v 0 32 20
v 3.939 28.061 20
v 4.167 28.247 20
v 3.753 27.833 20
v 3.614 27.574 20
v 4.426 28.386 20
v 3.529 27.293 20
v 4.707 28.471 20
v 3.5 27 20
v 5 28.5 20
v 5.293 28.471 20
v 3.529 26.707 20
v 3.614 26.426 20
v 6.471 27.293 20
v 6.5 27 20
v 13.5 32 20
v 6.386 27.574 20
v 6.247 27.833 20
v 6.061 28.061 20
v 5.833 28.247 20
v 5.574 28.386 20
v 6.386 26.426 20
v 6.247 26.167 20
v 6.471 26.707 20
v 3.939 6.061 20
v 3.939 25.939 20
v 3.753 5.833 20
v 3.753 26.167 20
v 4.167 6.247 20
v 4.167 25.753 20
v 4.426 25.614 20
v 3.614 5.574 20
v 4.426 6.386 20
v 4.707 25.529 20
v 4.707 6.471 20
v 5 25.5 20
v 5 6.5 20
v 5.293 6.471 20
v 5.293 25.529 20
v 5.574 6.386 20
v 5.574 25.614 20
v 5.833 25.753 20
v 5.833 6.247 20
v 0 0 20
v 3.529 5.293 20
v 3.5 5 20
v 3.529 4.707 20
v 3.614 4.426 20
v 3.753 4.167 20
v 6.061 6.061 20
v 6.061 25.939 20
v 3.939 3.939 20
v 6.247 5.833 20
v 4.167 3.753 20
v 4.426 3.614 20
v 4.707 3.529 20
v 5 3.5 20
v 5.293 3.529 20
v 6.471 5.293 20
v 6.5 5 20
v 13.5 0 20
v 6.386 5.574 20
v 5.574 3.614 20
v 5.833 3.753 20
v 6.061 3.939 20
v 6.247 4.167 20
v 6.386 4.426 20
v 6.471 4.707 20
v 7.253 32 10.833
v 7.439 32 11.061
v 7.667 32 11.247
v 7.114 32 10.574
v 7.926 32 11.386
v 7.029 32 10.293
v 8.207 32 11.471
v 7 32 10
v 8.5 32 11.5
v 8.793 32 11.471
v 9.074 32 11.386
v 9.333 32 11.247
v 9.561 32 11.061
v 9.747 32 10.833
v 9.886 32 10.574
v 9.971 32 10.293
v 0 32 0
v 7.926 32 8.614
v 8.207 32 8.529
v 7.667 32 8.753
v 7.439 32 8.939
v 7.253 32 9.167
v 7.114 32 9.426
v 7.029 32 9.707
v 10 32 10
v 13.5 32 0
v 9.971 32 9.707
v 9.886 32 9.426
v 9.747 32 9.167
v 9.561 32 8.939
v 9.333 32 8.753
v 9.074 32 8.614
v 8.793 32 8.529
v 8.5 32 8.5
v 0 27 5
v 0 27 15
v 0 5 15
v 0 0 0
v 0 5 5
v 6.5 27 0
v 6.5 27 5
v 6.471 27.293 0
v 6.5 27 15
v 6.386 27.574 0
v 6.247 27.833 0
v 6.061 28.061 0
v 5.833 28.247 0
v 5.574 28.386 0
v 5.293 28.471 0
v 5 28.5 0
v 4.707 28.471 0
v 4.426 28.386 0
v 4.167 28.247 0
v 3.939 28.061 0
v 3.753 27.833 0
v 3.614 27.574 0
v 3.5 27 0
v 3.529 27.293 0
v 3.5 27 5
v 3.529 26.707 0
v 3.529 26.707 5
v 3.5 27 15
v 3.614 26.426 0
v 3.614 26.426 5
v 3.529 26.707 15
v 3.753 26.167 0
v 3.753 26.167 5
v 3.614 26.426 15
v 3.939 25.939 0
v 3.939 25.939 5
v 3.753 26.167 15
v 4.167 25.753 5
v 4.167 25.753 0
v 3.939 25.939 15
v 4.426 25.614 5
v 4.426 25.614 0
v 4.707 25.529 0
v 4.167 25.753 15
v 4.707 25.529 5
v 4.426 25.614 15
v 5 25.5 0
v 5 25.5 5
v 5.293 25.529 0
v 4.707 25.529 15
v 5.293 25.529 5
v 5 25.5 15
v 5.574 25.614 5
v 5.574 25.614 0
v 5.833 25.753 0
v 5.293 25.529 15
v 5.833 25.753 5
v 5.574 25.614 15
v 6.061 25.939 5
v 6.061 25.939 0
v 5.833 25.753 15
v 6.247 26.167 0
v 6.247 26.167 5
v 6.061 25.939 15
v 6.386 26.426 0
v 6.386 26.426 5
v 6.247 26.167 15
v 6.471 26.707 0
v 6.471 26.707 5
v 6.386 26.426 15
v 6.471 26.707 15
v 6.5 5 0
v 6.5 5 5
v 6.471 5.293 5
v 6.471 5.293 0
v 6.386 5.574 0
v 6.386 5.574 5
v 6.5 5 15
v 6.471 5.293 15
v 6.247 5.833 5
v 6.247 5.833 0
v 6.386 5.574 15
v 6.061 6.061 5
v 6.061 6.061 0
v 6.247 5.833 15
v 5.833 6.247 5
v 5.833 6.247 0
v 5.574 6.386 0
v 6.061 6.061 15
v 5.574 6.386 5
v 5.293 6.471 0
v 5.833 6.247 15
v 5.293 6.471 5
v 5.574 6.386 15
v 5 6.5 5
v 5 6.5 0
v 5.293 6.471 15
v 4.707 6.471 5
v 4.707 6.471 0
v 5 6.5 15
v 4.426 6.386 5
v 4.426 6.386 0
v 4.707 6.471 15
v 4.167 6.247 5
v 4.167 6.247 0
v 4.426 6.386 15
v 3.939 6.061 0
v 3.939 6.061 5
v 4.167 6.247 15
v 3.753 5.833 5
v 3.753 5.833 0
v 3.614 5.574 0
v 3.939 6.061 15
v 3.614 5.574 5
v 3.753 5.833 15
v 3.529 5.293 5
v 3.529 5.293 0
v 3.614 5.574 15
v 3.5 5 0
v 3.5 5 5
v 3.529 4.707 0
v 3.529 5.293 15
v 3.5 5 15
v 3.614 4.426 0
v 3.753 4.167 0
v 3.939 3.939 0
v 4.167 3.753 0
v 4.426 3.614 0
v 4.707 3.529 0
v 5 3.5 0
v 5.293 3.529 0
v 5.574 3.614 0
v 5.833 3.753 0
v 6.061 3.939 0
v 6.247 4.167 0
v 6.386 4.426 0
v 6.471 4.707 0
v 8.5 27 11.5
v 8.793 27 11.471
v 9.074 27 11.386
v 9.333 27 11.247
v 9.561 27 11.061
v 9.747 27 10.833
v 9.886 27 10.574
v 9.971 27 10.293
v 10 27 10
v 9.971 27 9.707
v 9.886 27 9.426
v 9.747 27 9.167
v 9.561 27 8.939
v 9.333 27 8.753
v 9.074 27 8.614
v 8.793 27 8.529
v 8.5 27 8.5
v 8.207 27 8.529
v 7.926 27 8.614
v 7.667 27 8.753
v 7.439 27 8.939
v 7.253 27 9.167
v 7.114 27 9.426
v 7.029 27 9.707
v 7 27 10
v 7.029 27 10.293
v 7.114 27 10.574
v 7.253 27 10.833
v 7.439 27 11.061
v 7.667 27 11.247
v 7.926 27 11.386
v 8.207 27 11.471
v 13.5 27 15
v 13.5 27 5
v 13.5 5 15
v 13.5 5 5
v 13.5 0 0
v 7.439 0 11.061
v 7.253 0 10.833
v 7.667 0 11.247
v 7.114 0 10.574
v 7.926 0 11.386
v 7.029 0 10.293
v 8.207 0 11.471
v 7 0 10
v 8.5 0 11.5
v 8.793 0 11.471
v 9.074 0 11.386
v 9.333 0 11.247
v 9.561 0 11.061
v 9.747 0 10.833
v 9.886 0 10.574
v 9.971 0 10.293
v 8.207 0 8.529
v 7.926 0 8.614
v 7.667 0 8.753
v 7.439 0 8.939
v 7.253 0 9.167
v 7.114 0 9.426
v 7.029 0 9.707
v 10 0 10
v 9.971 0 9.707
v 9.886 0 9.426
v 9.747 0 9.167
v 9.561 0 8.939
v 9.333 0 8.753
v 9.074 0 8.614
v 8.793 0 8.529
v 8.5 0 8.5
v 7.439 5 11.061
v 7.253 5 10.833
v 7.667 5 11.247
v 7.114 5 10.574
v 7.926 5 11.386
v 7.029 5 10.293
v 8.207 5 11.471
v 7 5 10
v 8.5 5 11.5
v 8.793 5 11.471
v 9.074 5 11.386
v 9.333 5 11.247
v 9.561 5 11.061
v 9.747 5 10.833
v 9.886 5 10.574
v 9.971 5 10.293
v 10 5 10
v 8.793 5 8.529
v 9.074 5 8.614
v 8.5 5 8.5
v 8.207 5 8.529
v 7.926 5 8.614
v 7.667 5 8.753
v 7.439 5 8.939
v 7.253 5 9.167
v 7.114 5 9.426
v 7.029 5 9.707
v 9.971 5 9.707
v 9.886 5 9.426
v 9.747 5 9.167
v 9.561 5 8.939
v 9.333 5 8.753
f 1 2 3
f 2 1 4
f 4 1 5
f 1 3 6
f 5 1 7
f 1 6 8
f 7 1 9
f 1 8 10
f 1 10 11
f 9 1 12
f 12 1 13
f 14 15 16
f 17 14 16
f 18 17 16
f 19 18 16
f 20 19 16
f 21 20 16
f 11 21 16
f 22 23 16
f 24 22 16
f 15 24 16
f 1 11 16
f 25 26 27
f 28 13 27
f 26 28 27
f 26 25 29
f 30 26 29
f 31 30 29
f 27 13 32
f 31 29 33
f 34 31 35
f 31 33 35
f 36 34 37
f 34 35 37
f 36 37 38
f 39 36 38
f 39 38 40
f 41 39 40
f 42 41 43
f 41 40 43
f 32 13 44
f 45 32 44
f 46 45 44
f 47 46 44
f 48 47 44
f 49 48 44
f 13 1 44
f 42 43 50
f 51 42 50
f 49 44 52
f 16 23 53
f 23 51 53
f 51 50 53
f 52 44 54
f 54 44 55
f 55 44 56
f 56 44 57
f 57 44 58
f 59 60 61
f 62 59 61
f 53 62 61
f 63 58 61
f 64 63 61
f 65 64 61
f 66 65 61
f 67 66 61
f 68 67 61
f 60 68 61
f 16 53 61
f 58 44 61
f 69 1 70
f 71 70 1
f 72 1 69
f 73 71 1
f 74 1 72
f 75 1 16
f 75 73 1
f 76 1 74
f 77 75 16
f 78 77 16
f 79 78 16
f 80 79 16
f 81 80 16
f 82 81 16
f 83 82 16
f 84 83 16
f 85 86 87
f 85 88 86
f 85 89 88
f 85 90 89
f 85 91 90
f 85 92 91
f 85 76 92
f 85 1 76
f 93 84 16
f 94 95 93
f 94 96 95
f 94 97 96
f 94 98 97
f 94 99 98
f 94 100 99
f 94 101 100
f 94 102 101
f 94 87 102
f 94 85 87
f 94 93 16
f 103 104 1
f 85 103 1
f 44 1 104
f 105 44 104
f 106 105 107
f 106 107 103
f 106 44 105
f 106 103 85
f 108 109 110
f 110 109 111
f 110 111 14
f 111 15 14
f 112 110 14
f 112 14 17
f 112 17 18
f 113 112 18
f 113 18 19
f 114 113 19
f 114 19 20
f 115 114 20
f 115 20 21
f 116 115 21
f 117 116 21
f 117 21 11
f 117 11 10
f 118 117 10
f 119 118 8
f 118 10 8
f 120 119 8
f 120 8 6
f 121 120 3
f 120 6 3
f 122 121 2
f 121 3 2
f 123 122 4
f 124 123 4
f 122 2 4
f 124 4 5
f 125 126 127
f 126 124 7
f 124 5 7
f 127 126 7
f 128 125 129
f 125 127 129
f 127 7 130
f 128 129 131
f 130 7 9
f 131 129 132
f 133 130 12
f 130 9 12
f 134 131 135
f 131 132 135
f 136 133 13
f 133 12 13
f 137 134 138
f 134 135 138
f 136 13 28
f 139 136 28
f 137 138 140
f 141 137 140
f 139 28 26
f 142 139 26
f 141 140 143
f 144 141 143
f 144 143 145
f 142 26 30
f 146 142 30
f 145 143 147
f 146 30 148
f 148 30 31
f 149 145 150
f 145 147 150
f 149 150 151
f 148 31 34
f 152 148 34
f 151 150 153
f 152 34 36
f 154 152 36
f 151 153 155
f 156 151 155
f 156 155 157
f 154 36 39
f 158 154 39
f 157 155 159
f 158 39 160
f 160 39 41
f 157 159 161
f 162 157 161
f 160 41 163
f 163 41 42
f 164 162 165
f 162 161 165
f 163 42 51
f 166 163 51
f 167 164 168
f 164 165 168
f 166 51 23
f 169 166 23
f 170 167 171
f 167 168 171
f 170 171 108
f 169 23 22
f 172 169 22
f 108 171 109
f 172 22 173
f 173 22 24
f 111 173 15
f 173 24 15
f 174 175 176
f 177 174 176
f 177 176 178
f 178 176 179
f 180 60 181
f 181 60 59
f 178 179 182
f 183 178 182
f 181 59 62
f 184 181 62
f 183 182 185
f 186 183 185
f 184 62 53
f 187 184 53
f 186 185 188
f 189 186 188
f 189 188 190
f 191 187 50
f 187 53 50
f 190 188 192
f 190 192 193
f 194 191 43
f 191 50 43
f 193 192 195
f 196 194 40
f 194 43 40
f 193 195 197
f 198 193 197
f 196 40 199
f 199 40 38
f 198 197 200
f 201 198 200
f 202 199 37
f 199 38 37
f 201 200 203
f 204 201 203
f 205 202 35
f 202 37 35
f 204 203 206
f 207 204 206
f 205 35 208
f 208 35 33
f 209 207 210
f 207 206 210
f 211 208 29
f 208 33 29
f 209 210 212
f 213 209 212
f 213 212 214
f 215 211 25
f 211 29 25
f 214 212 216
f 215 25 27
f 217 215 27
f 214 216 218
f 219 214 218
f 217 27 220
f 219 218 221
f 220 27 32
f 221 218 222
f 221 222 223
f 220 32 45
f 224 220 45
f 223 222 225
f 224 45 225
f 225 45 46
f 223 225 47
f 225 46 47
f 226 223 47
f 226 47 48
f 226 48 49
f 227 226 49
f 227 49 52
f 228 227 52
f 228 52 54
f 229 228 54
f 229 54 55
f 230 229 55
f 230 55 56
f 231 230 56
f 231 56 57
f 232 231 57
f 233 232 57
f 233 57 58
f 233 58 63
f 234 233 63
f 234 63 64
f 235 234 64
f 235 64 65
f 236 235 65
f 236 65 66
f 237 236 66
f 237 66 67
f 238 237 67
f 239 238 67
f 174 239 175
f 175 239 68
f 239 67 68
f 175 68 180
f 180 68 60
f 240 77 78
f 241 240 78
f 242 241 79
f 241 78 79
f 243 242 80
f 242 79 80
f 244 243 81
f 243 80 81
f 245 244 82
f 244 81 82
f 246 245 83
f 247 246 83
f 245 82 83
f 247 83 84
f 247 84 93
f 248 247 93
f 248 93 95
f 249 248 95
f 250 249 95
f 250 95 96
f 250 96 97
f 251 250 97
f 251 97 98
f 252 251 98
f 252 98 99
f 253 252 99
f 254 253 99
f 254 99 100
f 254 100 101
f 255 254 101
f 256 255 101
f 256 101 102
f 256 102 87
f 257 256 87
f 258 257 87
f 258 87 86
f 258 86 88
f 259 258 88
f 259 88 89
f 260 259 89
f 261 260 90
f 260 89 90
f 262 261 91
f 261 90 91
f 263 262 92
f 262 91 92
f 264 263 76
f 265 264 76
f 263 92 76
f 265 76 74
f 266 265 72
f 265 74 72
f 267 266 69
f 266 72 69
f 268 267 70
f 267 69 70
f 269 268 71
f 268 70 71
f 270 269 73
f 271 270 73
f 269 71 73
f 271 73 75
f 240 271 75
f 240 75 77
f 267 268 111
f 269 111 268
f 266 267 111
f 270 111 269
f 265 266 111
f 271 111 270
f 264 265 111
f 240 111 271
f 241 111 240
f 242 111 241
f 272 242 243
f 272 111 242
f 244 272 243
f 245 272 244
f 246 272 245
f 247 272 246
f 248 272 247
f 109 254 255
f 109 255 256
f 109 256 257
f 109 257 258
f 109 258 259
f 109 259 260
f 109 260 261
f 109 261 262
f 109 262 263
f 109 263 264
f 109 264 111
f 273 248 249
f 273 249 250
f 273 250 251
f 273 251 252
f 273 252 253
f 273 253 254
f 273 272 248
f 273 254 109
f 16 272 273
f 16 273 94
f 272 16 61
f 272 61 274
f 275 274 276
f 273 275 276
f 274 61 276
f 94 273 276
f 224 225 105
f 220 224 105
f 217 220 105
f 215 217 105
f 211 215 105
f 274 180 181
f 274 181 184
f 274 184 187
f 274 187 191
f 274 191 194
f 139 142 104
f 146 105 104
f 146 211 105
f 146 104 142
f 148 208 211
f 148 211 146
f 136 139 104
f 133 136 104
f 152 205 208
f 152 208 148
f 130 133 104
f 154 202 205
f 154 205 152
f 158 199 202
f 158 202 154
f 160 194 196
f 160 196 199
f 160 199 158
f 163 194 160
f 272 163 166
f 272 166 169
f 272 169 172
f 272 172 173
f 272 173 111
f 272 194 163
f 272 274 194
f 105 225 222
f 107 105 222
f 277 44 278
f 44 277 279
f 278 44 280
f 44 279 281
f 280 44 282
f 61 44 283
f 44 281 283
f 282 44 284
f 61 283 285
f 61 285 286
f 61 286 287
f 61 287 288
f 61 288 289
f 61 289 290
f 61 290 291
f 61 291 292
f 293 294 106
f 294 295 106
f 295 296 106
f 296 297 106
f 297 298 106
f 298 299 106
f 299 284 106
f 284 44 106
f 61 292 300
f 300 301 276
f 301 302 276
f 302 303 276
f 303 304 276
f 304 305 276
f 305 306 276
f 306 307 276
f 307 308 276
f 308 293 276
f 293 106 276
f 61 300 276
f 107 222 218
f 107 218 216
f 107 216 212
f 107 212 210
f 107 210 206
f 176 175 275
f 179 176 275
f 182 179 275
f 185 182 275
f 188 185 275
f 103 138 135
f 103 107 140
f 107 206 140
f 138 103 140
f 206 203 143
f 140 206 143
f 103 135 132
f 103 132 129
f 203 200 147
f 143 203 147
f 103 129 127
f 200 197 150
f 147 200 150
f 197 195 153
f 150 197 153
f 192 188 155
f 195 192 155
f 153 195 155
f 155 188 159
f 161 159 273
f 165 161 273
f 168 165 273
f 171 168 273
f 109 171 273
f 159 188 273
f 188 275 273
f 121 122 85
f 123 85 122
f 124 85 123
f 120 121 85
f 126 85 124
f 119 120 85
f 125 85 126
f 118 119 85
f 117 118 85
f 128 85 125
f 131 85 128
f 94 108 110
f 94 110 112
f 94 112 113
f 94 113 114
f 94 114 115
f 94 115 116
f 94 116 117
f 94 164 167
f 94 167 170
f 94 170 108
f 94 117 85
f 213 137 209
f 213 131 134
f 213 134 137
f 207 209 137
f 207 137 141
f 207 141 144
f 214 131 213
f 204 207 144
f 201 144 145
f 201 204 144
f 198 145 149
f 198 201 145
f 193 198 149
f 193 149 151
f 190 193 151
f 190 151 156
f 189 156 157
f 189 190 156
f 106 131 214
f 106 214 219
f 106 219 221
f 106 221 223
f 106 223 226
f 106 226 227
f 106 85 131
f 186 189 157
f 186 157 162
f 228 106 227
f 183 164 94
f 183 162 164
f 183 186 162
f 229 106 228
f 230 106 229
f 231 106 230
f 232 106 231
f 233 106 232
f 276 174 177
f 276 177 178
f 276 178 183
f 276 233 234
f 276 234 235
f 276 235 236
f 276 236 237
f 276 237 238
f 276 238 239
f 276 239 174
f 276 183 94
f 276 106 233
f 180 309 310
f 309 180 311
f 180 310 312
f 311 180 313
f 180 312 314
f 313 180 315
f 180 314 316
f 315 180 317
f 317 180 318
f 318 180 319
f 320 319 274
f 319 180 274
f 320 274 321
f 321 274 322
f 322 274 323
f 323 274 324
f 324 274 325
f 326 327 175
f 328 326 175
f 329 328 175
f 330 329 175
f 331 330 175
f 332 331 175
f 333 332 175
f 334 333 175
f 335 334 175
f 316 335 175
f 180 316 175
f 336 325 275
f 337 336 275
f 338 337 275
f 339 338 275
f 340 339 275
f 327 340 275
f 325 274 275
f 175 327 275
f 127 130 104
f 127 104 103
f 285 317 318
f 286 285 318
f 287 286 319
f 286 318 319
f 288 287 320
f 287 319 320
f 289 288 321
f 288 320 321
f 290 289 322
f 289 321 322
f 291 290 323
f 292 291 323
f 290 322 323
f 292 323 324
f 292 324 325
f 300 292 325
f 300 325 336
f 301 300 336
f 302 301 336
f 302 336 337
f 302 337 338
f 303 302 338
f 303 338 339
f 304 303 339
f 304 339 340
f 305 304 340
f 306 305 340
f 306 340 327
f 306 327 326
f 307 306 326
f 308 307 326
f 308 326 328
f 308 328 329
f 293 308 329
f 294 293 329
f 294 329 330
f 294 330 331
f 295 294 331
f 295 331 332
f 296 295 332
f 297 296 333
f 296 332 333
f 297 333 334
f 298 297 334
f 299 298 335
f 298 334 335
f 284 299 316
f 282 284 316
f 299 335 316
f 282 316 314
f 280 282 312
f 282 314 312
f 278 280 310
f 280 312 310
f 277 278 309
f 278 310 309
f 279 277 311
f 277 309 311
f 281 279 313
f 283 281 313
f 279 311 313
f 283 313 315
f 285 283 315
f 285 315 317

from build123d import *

# Parameters (mm, degrees)
SKETCH1_W           = 13.5
SKETCH1_H           = 20
BOSS_EXTRUDE1_DEPTH = 32
SKETCH2_R           = 1.5
CUT_EXTRUDE1_DEPTH  = 41.078048855
SKETCH3_R           = 1.5
CUT_EXTRUDE2_DEPTH  = 41.078048855
SKETCH4_W           = 10
SKETCH4_H           = 22
CUT_EXTRUDE3_DEPTH  = 41.078048855


with BuildPart() as part:
    # Sketch1 → Boss-Extrude1 (new body)
    with BuildSketch(Plane(origin=(0, 0, 0), x_dir=(1, 0, 0), z_dir=(0, 1, 0))):
        with Locations((6.75, -10)):
            Rectangle(SKETCH1_W, SKETCH1_H)
    extrude(amount=BOSS_EXTRUDE1_DEPTH)

    # Sketch2 → Cut-Extrude1 (cut, through all)
    with BuildSketch(Plane.XY.offset(20)):
        with Locations((5, 27)):
            Circle(SKETCH2_R)
        with Locations((5, 5)):
            Circle(SKETCH2_R)
    extrude(amount=-CUT_EXTRUDE1_DEPTH, mode=Mode.SUBTRACT)

    # Sketch3 → Cut-Extrude2 (cut, through all)
    with BuildSketch(Plane(origin=(0, 32, 0), x_dir=(1, 0, 0), z_dir=(0, 1, 0))):
        with Locations(Location((8.5, -10, 0), (0, 0, 270))):
            Circle(SKETCH3_R)
    extrude(amount=-CUT_EXTRUDE2_DEPTH, mode=Mode.SUBTRACT)

    # Sketch4 → Cut-Extrude3 (cut, through all)
    with BuildSketch(Plane(origin=(13.5, 0, 0), x_dir=(0, 0, -1), z_dir=(1, 0, 0))):
        with Locations((-10, 16)):
            Rectangle(SKETCH4_W, SKETCH4_H)
    extrude(amount=-CUT_EXTRUDE3_DEPTH, mode=Mode.SUBTRACT)


solid = part.part
